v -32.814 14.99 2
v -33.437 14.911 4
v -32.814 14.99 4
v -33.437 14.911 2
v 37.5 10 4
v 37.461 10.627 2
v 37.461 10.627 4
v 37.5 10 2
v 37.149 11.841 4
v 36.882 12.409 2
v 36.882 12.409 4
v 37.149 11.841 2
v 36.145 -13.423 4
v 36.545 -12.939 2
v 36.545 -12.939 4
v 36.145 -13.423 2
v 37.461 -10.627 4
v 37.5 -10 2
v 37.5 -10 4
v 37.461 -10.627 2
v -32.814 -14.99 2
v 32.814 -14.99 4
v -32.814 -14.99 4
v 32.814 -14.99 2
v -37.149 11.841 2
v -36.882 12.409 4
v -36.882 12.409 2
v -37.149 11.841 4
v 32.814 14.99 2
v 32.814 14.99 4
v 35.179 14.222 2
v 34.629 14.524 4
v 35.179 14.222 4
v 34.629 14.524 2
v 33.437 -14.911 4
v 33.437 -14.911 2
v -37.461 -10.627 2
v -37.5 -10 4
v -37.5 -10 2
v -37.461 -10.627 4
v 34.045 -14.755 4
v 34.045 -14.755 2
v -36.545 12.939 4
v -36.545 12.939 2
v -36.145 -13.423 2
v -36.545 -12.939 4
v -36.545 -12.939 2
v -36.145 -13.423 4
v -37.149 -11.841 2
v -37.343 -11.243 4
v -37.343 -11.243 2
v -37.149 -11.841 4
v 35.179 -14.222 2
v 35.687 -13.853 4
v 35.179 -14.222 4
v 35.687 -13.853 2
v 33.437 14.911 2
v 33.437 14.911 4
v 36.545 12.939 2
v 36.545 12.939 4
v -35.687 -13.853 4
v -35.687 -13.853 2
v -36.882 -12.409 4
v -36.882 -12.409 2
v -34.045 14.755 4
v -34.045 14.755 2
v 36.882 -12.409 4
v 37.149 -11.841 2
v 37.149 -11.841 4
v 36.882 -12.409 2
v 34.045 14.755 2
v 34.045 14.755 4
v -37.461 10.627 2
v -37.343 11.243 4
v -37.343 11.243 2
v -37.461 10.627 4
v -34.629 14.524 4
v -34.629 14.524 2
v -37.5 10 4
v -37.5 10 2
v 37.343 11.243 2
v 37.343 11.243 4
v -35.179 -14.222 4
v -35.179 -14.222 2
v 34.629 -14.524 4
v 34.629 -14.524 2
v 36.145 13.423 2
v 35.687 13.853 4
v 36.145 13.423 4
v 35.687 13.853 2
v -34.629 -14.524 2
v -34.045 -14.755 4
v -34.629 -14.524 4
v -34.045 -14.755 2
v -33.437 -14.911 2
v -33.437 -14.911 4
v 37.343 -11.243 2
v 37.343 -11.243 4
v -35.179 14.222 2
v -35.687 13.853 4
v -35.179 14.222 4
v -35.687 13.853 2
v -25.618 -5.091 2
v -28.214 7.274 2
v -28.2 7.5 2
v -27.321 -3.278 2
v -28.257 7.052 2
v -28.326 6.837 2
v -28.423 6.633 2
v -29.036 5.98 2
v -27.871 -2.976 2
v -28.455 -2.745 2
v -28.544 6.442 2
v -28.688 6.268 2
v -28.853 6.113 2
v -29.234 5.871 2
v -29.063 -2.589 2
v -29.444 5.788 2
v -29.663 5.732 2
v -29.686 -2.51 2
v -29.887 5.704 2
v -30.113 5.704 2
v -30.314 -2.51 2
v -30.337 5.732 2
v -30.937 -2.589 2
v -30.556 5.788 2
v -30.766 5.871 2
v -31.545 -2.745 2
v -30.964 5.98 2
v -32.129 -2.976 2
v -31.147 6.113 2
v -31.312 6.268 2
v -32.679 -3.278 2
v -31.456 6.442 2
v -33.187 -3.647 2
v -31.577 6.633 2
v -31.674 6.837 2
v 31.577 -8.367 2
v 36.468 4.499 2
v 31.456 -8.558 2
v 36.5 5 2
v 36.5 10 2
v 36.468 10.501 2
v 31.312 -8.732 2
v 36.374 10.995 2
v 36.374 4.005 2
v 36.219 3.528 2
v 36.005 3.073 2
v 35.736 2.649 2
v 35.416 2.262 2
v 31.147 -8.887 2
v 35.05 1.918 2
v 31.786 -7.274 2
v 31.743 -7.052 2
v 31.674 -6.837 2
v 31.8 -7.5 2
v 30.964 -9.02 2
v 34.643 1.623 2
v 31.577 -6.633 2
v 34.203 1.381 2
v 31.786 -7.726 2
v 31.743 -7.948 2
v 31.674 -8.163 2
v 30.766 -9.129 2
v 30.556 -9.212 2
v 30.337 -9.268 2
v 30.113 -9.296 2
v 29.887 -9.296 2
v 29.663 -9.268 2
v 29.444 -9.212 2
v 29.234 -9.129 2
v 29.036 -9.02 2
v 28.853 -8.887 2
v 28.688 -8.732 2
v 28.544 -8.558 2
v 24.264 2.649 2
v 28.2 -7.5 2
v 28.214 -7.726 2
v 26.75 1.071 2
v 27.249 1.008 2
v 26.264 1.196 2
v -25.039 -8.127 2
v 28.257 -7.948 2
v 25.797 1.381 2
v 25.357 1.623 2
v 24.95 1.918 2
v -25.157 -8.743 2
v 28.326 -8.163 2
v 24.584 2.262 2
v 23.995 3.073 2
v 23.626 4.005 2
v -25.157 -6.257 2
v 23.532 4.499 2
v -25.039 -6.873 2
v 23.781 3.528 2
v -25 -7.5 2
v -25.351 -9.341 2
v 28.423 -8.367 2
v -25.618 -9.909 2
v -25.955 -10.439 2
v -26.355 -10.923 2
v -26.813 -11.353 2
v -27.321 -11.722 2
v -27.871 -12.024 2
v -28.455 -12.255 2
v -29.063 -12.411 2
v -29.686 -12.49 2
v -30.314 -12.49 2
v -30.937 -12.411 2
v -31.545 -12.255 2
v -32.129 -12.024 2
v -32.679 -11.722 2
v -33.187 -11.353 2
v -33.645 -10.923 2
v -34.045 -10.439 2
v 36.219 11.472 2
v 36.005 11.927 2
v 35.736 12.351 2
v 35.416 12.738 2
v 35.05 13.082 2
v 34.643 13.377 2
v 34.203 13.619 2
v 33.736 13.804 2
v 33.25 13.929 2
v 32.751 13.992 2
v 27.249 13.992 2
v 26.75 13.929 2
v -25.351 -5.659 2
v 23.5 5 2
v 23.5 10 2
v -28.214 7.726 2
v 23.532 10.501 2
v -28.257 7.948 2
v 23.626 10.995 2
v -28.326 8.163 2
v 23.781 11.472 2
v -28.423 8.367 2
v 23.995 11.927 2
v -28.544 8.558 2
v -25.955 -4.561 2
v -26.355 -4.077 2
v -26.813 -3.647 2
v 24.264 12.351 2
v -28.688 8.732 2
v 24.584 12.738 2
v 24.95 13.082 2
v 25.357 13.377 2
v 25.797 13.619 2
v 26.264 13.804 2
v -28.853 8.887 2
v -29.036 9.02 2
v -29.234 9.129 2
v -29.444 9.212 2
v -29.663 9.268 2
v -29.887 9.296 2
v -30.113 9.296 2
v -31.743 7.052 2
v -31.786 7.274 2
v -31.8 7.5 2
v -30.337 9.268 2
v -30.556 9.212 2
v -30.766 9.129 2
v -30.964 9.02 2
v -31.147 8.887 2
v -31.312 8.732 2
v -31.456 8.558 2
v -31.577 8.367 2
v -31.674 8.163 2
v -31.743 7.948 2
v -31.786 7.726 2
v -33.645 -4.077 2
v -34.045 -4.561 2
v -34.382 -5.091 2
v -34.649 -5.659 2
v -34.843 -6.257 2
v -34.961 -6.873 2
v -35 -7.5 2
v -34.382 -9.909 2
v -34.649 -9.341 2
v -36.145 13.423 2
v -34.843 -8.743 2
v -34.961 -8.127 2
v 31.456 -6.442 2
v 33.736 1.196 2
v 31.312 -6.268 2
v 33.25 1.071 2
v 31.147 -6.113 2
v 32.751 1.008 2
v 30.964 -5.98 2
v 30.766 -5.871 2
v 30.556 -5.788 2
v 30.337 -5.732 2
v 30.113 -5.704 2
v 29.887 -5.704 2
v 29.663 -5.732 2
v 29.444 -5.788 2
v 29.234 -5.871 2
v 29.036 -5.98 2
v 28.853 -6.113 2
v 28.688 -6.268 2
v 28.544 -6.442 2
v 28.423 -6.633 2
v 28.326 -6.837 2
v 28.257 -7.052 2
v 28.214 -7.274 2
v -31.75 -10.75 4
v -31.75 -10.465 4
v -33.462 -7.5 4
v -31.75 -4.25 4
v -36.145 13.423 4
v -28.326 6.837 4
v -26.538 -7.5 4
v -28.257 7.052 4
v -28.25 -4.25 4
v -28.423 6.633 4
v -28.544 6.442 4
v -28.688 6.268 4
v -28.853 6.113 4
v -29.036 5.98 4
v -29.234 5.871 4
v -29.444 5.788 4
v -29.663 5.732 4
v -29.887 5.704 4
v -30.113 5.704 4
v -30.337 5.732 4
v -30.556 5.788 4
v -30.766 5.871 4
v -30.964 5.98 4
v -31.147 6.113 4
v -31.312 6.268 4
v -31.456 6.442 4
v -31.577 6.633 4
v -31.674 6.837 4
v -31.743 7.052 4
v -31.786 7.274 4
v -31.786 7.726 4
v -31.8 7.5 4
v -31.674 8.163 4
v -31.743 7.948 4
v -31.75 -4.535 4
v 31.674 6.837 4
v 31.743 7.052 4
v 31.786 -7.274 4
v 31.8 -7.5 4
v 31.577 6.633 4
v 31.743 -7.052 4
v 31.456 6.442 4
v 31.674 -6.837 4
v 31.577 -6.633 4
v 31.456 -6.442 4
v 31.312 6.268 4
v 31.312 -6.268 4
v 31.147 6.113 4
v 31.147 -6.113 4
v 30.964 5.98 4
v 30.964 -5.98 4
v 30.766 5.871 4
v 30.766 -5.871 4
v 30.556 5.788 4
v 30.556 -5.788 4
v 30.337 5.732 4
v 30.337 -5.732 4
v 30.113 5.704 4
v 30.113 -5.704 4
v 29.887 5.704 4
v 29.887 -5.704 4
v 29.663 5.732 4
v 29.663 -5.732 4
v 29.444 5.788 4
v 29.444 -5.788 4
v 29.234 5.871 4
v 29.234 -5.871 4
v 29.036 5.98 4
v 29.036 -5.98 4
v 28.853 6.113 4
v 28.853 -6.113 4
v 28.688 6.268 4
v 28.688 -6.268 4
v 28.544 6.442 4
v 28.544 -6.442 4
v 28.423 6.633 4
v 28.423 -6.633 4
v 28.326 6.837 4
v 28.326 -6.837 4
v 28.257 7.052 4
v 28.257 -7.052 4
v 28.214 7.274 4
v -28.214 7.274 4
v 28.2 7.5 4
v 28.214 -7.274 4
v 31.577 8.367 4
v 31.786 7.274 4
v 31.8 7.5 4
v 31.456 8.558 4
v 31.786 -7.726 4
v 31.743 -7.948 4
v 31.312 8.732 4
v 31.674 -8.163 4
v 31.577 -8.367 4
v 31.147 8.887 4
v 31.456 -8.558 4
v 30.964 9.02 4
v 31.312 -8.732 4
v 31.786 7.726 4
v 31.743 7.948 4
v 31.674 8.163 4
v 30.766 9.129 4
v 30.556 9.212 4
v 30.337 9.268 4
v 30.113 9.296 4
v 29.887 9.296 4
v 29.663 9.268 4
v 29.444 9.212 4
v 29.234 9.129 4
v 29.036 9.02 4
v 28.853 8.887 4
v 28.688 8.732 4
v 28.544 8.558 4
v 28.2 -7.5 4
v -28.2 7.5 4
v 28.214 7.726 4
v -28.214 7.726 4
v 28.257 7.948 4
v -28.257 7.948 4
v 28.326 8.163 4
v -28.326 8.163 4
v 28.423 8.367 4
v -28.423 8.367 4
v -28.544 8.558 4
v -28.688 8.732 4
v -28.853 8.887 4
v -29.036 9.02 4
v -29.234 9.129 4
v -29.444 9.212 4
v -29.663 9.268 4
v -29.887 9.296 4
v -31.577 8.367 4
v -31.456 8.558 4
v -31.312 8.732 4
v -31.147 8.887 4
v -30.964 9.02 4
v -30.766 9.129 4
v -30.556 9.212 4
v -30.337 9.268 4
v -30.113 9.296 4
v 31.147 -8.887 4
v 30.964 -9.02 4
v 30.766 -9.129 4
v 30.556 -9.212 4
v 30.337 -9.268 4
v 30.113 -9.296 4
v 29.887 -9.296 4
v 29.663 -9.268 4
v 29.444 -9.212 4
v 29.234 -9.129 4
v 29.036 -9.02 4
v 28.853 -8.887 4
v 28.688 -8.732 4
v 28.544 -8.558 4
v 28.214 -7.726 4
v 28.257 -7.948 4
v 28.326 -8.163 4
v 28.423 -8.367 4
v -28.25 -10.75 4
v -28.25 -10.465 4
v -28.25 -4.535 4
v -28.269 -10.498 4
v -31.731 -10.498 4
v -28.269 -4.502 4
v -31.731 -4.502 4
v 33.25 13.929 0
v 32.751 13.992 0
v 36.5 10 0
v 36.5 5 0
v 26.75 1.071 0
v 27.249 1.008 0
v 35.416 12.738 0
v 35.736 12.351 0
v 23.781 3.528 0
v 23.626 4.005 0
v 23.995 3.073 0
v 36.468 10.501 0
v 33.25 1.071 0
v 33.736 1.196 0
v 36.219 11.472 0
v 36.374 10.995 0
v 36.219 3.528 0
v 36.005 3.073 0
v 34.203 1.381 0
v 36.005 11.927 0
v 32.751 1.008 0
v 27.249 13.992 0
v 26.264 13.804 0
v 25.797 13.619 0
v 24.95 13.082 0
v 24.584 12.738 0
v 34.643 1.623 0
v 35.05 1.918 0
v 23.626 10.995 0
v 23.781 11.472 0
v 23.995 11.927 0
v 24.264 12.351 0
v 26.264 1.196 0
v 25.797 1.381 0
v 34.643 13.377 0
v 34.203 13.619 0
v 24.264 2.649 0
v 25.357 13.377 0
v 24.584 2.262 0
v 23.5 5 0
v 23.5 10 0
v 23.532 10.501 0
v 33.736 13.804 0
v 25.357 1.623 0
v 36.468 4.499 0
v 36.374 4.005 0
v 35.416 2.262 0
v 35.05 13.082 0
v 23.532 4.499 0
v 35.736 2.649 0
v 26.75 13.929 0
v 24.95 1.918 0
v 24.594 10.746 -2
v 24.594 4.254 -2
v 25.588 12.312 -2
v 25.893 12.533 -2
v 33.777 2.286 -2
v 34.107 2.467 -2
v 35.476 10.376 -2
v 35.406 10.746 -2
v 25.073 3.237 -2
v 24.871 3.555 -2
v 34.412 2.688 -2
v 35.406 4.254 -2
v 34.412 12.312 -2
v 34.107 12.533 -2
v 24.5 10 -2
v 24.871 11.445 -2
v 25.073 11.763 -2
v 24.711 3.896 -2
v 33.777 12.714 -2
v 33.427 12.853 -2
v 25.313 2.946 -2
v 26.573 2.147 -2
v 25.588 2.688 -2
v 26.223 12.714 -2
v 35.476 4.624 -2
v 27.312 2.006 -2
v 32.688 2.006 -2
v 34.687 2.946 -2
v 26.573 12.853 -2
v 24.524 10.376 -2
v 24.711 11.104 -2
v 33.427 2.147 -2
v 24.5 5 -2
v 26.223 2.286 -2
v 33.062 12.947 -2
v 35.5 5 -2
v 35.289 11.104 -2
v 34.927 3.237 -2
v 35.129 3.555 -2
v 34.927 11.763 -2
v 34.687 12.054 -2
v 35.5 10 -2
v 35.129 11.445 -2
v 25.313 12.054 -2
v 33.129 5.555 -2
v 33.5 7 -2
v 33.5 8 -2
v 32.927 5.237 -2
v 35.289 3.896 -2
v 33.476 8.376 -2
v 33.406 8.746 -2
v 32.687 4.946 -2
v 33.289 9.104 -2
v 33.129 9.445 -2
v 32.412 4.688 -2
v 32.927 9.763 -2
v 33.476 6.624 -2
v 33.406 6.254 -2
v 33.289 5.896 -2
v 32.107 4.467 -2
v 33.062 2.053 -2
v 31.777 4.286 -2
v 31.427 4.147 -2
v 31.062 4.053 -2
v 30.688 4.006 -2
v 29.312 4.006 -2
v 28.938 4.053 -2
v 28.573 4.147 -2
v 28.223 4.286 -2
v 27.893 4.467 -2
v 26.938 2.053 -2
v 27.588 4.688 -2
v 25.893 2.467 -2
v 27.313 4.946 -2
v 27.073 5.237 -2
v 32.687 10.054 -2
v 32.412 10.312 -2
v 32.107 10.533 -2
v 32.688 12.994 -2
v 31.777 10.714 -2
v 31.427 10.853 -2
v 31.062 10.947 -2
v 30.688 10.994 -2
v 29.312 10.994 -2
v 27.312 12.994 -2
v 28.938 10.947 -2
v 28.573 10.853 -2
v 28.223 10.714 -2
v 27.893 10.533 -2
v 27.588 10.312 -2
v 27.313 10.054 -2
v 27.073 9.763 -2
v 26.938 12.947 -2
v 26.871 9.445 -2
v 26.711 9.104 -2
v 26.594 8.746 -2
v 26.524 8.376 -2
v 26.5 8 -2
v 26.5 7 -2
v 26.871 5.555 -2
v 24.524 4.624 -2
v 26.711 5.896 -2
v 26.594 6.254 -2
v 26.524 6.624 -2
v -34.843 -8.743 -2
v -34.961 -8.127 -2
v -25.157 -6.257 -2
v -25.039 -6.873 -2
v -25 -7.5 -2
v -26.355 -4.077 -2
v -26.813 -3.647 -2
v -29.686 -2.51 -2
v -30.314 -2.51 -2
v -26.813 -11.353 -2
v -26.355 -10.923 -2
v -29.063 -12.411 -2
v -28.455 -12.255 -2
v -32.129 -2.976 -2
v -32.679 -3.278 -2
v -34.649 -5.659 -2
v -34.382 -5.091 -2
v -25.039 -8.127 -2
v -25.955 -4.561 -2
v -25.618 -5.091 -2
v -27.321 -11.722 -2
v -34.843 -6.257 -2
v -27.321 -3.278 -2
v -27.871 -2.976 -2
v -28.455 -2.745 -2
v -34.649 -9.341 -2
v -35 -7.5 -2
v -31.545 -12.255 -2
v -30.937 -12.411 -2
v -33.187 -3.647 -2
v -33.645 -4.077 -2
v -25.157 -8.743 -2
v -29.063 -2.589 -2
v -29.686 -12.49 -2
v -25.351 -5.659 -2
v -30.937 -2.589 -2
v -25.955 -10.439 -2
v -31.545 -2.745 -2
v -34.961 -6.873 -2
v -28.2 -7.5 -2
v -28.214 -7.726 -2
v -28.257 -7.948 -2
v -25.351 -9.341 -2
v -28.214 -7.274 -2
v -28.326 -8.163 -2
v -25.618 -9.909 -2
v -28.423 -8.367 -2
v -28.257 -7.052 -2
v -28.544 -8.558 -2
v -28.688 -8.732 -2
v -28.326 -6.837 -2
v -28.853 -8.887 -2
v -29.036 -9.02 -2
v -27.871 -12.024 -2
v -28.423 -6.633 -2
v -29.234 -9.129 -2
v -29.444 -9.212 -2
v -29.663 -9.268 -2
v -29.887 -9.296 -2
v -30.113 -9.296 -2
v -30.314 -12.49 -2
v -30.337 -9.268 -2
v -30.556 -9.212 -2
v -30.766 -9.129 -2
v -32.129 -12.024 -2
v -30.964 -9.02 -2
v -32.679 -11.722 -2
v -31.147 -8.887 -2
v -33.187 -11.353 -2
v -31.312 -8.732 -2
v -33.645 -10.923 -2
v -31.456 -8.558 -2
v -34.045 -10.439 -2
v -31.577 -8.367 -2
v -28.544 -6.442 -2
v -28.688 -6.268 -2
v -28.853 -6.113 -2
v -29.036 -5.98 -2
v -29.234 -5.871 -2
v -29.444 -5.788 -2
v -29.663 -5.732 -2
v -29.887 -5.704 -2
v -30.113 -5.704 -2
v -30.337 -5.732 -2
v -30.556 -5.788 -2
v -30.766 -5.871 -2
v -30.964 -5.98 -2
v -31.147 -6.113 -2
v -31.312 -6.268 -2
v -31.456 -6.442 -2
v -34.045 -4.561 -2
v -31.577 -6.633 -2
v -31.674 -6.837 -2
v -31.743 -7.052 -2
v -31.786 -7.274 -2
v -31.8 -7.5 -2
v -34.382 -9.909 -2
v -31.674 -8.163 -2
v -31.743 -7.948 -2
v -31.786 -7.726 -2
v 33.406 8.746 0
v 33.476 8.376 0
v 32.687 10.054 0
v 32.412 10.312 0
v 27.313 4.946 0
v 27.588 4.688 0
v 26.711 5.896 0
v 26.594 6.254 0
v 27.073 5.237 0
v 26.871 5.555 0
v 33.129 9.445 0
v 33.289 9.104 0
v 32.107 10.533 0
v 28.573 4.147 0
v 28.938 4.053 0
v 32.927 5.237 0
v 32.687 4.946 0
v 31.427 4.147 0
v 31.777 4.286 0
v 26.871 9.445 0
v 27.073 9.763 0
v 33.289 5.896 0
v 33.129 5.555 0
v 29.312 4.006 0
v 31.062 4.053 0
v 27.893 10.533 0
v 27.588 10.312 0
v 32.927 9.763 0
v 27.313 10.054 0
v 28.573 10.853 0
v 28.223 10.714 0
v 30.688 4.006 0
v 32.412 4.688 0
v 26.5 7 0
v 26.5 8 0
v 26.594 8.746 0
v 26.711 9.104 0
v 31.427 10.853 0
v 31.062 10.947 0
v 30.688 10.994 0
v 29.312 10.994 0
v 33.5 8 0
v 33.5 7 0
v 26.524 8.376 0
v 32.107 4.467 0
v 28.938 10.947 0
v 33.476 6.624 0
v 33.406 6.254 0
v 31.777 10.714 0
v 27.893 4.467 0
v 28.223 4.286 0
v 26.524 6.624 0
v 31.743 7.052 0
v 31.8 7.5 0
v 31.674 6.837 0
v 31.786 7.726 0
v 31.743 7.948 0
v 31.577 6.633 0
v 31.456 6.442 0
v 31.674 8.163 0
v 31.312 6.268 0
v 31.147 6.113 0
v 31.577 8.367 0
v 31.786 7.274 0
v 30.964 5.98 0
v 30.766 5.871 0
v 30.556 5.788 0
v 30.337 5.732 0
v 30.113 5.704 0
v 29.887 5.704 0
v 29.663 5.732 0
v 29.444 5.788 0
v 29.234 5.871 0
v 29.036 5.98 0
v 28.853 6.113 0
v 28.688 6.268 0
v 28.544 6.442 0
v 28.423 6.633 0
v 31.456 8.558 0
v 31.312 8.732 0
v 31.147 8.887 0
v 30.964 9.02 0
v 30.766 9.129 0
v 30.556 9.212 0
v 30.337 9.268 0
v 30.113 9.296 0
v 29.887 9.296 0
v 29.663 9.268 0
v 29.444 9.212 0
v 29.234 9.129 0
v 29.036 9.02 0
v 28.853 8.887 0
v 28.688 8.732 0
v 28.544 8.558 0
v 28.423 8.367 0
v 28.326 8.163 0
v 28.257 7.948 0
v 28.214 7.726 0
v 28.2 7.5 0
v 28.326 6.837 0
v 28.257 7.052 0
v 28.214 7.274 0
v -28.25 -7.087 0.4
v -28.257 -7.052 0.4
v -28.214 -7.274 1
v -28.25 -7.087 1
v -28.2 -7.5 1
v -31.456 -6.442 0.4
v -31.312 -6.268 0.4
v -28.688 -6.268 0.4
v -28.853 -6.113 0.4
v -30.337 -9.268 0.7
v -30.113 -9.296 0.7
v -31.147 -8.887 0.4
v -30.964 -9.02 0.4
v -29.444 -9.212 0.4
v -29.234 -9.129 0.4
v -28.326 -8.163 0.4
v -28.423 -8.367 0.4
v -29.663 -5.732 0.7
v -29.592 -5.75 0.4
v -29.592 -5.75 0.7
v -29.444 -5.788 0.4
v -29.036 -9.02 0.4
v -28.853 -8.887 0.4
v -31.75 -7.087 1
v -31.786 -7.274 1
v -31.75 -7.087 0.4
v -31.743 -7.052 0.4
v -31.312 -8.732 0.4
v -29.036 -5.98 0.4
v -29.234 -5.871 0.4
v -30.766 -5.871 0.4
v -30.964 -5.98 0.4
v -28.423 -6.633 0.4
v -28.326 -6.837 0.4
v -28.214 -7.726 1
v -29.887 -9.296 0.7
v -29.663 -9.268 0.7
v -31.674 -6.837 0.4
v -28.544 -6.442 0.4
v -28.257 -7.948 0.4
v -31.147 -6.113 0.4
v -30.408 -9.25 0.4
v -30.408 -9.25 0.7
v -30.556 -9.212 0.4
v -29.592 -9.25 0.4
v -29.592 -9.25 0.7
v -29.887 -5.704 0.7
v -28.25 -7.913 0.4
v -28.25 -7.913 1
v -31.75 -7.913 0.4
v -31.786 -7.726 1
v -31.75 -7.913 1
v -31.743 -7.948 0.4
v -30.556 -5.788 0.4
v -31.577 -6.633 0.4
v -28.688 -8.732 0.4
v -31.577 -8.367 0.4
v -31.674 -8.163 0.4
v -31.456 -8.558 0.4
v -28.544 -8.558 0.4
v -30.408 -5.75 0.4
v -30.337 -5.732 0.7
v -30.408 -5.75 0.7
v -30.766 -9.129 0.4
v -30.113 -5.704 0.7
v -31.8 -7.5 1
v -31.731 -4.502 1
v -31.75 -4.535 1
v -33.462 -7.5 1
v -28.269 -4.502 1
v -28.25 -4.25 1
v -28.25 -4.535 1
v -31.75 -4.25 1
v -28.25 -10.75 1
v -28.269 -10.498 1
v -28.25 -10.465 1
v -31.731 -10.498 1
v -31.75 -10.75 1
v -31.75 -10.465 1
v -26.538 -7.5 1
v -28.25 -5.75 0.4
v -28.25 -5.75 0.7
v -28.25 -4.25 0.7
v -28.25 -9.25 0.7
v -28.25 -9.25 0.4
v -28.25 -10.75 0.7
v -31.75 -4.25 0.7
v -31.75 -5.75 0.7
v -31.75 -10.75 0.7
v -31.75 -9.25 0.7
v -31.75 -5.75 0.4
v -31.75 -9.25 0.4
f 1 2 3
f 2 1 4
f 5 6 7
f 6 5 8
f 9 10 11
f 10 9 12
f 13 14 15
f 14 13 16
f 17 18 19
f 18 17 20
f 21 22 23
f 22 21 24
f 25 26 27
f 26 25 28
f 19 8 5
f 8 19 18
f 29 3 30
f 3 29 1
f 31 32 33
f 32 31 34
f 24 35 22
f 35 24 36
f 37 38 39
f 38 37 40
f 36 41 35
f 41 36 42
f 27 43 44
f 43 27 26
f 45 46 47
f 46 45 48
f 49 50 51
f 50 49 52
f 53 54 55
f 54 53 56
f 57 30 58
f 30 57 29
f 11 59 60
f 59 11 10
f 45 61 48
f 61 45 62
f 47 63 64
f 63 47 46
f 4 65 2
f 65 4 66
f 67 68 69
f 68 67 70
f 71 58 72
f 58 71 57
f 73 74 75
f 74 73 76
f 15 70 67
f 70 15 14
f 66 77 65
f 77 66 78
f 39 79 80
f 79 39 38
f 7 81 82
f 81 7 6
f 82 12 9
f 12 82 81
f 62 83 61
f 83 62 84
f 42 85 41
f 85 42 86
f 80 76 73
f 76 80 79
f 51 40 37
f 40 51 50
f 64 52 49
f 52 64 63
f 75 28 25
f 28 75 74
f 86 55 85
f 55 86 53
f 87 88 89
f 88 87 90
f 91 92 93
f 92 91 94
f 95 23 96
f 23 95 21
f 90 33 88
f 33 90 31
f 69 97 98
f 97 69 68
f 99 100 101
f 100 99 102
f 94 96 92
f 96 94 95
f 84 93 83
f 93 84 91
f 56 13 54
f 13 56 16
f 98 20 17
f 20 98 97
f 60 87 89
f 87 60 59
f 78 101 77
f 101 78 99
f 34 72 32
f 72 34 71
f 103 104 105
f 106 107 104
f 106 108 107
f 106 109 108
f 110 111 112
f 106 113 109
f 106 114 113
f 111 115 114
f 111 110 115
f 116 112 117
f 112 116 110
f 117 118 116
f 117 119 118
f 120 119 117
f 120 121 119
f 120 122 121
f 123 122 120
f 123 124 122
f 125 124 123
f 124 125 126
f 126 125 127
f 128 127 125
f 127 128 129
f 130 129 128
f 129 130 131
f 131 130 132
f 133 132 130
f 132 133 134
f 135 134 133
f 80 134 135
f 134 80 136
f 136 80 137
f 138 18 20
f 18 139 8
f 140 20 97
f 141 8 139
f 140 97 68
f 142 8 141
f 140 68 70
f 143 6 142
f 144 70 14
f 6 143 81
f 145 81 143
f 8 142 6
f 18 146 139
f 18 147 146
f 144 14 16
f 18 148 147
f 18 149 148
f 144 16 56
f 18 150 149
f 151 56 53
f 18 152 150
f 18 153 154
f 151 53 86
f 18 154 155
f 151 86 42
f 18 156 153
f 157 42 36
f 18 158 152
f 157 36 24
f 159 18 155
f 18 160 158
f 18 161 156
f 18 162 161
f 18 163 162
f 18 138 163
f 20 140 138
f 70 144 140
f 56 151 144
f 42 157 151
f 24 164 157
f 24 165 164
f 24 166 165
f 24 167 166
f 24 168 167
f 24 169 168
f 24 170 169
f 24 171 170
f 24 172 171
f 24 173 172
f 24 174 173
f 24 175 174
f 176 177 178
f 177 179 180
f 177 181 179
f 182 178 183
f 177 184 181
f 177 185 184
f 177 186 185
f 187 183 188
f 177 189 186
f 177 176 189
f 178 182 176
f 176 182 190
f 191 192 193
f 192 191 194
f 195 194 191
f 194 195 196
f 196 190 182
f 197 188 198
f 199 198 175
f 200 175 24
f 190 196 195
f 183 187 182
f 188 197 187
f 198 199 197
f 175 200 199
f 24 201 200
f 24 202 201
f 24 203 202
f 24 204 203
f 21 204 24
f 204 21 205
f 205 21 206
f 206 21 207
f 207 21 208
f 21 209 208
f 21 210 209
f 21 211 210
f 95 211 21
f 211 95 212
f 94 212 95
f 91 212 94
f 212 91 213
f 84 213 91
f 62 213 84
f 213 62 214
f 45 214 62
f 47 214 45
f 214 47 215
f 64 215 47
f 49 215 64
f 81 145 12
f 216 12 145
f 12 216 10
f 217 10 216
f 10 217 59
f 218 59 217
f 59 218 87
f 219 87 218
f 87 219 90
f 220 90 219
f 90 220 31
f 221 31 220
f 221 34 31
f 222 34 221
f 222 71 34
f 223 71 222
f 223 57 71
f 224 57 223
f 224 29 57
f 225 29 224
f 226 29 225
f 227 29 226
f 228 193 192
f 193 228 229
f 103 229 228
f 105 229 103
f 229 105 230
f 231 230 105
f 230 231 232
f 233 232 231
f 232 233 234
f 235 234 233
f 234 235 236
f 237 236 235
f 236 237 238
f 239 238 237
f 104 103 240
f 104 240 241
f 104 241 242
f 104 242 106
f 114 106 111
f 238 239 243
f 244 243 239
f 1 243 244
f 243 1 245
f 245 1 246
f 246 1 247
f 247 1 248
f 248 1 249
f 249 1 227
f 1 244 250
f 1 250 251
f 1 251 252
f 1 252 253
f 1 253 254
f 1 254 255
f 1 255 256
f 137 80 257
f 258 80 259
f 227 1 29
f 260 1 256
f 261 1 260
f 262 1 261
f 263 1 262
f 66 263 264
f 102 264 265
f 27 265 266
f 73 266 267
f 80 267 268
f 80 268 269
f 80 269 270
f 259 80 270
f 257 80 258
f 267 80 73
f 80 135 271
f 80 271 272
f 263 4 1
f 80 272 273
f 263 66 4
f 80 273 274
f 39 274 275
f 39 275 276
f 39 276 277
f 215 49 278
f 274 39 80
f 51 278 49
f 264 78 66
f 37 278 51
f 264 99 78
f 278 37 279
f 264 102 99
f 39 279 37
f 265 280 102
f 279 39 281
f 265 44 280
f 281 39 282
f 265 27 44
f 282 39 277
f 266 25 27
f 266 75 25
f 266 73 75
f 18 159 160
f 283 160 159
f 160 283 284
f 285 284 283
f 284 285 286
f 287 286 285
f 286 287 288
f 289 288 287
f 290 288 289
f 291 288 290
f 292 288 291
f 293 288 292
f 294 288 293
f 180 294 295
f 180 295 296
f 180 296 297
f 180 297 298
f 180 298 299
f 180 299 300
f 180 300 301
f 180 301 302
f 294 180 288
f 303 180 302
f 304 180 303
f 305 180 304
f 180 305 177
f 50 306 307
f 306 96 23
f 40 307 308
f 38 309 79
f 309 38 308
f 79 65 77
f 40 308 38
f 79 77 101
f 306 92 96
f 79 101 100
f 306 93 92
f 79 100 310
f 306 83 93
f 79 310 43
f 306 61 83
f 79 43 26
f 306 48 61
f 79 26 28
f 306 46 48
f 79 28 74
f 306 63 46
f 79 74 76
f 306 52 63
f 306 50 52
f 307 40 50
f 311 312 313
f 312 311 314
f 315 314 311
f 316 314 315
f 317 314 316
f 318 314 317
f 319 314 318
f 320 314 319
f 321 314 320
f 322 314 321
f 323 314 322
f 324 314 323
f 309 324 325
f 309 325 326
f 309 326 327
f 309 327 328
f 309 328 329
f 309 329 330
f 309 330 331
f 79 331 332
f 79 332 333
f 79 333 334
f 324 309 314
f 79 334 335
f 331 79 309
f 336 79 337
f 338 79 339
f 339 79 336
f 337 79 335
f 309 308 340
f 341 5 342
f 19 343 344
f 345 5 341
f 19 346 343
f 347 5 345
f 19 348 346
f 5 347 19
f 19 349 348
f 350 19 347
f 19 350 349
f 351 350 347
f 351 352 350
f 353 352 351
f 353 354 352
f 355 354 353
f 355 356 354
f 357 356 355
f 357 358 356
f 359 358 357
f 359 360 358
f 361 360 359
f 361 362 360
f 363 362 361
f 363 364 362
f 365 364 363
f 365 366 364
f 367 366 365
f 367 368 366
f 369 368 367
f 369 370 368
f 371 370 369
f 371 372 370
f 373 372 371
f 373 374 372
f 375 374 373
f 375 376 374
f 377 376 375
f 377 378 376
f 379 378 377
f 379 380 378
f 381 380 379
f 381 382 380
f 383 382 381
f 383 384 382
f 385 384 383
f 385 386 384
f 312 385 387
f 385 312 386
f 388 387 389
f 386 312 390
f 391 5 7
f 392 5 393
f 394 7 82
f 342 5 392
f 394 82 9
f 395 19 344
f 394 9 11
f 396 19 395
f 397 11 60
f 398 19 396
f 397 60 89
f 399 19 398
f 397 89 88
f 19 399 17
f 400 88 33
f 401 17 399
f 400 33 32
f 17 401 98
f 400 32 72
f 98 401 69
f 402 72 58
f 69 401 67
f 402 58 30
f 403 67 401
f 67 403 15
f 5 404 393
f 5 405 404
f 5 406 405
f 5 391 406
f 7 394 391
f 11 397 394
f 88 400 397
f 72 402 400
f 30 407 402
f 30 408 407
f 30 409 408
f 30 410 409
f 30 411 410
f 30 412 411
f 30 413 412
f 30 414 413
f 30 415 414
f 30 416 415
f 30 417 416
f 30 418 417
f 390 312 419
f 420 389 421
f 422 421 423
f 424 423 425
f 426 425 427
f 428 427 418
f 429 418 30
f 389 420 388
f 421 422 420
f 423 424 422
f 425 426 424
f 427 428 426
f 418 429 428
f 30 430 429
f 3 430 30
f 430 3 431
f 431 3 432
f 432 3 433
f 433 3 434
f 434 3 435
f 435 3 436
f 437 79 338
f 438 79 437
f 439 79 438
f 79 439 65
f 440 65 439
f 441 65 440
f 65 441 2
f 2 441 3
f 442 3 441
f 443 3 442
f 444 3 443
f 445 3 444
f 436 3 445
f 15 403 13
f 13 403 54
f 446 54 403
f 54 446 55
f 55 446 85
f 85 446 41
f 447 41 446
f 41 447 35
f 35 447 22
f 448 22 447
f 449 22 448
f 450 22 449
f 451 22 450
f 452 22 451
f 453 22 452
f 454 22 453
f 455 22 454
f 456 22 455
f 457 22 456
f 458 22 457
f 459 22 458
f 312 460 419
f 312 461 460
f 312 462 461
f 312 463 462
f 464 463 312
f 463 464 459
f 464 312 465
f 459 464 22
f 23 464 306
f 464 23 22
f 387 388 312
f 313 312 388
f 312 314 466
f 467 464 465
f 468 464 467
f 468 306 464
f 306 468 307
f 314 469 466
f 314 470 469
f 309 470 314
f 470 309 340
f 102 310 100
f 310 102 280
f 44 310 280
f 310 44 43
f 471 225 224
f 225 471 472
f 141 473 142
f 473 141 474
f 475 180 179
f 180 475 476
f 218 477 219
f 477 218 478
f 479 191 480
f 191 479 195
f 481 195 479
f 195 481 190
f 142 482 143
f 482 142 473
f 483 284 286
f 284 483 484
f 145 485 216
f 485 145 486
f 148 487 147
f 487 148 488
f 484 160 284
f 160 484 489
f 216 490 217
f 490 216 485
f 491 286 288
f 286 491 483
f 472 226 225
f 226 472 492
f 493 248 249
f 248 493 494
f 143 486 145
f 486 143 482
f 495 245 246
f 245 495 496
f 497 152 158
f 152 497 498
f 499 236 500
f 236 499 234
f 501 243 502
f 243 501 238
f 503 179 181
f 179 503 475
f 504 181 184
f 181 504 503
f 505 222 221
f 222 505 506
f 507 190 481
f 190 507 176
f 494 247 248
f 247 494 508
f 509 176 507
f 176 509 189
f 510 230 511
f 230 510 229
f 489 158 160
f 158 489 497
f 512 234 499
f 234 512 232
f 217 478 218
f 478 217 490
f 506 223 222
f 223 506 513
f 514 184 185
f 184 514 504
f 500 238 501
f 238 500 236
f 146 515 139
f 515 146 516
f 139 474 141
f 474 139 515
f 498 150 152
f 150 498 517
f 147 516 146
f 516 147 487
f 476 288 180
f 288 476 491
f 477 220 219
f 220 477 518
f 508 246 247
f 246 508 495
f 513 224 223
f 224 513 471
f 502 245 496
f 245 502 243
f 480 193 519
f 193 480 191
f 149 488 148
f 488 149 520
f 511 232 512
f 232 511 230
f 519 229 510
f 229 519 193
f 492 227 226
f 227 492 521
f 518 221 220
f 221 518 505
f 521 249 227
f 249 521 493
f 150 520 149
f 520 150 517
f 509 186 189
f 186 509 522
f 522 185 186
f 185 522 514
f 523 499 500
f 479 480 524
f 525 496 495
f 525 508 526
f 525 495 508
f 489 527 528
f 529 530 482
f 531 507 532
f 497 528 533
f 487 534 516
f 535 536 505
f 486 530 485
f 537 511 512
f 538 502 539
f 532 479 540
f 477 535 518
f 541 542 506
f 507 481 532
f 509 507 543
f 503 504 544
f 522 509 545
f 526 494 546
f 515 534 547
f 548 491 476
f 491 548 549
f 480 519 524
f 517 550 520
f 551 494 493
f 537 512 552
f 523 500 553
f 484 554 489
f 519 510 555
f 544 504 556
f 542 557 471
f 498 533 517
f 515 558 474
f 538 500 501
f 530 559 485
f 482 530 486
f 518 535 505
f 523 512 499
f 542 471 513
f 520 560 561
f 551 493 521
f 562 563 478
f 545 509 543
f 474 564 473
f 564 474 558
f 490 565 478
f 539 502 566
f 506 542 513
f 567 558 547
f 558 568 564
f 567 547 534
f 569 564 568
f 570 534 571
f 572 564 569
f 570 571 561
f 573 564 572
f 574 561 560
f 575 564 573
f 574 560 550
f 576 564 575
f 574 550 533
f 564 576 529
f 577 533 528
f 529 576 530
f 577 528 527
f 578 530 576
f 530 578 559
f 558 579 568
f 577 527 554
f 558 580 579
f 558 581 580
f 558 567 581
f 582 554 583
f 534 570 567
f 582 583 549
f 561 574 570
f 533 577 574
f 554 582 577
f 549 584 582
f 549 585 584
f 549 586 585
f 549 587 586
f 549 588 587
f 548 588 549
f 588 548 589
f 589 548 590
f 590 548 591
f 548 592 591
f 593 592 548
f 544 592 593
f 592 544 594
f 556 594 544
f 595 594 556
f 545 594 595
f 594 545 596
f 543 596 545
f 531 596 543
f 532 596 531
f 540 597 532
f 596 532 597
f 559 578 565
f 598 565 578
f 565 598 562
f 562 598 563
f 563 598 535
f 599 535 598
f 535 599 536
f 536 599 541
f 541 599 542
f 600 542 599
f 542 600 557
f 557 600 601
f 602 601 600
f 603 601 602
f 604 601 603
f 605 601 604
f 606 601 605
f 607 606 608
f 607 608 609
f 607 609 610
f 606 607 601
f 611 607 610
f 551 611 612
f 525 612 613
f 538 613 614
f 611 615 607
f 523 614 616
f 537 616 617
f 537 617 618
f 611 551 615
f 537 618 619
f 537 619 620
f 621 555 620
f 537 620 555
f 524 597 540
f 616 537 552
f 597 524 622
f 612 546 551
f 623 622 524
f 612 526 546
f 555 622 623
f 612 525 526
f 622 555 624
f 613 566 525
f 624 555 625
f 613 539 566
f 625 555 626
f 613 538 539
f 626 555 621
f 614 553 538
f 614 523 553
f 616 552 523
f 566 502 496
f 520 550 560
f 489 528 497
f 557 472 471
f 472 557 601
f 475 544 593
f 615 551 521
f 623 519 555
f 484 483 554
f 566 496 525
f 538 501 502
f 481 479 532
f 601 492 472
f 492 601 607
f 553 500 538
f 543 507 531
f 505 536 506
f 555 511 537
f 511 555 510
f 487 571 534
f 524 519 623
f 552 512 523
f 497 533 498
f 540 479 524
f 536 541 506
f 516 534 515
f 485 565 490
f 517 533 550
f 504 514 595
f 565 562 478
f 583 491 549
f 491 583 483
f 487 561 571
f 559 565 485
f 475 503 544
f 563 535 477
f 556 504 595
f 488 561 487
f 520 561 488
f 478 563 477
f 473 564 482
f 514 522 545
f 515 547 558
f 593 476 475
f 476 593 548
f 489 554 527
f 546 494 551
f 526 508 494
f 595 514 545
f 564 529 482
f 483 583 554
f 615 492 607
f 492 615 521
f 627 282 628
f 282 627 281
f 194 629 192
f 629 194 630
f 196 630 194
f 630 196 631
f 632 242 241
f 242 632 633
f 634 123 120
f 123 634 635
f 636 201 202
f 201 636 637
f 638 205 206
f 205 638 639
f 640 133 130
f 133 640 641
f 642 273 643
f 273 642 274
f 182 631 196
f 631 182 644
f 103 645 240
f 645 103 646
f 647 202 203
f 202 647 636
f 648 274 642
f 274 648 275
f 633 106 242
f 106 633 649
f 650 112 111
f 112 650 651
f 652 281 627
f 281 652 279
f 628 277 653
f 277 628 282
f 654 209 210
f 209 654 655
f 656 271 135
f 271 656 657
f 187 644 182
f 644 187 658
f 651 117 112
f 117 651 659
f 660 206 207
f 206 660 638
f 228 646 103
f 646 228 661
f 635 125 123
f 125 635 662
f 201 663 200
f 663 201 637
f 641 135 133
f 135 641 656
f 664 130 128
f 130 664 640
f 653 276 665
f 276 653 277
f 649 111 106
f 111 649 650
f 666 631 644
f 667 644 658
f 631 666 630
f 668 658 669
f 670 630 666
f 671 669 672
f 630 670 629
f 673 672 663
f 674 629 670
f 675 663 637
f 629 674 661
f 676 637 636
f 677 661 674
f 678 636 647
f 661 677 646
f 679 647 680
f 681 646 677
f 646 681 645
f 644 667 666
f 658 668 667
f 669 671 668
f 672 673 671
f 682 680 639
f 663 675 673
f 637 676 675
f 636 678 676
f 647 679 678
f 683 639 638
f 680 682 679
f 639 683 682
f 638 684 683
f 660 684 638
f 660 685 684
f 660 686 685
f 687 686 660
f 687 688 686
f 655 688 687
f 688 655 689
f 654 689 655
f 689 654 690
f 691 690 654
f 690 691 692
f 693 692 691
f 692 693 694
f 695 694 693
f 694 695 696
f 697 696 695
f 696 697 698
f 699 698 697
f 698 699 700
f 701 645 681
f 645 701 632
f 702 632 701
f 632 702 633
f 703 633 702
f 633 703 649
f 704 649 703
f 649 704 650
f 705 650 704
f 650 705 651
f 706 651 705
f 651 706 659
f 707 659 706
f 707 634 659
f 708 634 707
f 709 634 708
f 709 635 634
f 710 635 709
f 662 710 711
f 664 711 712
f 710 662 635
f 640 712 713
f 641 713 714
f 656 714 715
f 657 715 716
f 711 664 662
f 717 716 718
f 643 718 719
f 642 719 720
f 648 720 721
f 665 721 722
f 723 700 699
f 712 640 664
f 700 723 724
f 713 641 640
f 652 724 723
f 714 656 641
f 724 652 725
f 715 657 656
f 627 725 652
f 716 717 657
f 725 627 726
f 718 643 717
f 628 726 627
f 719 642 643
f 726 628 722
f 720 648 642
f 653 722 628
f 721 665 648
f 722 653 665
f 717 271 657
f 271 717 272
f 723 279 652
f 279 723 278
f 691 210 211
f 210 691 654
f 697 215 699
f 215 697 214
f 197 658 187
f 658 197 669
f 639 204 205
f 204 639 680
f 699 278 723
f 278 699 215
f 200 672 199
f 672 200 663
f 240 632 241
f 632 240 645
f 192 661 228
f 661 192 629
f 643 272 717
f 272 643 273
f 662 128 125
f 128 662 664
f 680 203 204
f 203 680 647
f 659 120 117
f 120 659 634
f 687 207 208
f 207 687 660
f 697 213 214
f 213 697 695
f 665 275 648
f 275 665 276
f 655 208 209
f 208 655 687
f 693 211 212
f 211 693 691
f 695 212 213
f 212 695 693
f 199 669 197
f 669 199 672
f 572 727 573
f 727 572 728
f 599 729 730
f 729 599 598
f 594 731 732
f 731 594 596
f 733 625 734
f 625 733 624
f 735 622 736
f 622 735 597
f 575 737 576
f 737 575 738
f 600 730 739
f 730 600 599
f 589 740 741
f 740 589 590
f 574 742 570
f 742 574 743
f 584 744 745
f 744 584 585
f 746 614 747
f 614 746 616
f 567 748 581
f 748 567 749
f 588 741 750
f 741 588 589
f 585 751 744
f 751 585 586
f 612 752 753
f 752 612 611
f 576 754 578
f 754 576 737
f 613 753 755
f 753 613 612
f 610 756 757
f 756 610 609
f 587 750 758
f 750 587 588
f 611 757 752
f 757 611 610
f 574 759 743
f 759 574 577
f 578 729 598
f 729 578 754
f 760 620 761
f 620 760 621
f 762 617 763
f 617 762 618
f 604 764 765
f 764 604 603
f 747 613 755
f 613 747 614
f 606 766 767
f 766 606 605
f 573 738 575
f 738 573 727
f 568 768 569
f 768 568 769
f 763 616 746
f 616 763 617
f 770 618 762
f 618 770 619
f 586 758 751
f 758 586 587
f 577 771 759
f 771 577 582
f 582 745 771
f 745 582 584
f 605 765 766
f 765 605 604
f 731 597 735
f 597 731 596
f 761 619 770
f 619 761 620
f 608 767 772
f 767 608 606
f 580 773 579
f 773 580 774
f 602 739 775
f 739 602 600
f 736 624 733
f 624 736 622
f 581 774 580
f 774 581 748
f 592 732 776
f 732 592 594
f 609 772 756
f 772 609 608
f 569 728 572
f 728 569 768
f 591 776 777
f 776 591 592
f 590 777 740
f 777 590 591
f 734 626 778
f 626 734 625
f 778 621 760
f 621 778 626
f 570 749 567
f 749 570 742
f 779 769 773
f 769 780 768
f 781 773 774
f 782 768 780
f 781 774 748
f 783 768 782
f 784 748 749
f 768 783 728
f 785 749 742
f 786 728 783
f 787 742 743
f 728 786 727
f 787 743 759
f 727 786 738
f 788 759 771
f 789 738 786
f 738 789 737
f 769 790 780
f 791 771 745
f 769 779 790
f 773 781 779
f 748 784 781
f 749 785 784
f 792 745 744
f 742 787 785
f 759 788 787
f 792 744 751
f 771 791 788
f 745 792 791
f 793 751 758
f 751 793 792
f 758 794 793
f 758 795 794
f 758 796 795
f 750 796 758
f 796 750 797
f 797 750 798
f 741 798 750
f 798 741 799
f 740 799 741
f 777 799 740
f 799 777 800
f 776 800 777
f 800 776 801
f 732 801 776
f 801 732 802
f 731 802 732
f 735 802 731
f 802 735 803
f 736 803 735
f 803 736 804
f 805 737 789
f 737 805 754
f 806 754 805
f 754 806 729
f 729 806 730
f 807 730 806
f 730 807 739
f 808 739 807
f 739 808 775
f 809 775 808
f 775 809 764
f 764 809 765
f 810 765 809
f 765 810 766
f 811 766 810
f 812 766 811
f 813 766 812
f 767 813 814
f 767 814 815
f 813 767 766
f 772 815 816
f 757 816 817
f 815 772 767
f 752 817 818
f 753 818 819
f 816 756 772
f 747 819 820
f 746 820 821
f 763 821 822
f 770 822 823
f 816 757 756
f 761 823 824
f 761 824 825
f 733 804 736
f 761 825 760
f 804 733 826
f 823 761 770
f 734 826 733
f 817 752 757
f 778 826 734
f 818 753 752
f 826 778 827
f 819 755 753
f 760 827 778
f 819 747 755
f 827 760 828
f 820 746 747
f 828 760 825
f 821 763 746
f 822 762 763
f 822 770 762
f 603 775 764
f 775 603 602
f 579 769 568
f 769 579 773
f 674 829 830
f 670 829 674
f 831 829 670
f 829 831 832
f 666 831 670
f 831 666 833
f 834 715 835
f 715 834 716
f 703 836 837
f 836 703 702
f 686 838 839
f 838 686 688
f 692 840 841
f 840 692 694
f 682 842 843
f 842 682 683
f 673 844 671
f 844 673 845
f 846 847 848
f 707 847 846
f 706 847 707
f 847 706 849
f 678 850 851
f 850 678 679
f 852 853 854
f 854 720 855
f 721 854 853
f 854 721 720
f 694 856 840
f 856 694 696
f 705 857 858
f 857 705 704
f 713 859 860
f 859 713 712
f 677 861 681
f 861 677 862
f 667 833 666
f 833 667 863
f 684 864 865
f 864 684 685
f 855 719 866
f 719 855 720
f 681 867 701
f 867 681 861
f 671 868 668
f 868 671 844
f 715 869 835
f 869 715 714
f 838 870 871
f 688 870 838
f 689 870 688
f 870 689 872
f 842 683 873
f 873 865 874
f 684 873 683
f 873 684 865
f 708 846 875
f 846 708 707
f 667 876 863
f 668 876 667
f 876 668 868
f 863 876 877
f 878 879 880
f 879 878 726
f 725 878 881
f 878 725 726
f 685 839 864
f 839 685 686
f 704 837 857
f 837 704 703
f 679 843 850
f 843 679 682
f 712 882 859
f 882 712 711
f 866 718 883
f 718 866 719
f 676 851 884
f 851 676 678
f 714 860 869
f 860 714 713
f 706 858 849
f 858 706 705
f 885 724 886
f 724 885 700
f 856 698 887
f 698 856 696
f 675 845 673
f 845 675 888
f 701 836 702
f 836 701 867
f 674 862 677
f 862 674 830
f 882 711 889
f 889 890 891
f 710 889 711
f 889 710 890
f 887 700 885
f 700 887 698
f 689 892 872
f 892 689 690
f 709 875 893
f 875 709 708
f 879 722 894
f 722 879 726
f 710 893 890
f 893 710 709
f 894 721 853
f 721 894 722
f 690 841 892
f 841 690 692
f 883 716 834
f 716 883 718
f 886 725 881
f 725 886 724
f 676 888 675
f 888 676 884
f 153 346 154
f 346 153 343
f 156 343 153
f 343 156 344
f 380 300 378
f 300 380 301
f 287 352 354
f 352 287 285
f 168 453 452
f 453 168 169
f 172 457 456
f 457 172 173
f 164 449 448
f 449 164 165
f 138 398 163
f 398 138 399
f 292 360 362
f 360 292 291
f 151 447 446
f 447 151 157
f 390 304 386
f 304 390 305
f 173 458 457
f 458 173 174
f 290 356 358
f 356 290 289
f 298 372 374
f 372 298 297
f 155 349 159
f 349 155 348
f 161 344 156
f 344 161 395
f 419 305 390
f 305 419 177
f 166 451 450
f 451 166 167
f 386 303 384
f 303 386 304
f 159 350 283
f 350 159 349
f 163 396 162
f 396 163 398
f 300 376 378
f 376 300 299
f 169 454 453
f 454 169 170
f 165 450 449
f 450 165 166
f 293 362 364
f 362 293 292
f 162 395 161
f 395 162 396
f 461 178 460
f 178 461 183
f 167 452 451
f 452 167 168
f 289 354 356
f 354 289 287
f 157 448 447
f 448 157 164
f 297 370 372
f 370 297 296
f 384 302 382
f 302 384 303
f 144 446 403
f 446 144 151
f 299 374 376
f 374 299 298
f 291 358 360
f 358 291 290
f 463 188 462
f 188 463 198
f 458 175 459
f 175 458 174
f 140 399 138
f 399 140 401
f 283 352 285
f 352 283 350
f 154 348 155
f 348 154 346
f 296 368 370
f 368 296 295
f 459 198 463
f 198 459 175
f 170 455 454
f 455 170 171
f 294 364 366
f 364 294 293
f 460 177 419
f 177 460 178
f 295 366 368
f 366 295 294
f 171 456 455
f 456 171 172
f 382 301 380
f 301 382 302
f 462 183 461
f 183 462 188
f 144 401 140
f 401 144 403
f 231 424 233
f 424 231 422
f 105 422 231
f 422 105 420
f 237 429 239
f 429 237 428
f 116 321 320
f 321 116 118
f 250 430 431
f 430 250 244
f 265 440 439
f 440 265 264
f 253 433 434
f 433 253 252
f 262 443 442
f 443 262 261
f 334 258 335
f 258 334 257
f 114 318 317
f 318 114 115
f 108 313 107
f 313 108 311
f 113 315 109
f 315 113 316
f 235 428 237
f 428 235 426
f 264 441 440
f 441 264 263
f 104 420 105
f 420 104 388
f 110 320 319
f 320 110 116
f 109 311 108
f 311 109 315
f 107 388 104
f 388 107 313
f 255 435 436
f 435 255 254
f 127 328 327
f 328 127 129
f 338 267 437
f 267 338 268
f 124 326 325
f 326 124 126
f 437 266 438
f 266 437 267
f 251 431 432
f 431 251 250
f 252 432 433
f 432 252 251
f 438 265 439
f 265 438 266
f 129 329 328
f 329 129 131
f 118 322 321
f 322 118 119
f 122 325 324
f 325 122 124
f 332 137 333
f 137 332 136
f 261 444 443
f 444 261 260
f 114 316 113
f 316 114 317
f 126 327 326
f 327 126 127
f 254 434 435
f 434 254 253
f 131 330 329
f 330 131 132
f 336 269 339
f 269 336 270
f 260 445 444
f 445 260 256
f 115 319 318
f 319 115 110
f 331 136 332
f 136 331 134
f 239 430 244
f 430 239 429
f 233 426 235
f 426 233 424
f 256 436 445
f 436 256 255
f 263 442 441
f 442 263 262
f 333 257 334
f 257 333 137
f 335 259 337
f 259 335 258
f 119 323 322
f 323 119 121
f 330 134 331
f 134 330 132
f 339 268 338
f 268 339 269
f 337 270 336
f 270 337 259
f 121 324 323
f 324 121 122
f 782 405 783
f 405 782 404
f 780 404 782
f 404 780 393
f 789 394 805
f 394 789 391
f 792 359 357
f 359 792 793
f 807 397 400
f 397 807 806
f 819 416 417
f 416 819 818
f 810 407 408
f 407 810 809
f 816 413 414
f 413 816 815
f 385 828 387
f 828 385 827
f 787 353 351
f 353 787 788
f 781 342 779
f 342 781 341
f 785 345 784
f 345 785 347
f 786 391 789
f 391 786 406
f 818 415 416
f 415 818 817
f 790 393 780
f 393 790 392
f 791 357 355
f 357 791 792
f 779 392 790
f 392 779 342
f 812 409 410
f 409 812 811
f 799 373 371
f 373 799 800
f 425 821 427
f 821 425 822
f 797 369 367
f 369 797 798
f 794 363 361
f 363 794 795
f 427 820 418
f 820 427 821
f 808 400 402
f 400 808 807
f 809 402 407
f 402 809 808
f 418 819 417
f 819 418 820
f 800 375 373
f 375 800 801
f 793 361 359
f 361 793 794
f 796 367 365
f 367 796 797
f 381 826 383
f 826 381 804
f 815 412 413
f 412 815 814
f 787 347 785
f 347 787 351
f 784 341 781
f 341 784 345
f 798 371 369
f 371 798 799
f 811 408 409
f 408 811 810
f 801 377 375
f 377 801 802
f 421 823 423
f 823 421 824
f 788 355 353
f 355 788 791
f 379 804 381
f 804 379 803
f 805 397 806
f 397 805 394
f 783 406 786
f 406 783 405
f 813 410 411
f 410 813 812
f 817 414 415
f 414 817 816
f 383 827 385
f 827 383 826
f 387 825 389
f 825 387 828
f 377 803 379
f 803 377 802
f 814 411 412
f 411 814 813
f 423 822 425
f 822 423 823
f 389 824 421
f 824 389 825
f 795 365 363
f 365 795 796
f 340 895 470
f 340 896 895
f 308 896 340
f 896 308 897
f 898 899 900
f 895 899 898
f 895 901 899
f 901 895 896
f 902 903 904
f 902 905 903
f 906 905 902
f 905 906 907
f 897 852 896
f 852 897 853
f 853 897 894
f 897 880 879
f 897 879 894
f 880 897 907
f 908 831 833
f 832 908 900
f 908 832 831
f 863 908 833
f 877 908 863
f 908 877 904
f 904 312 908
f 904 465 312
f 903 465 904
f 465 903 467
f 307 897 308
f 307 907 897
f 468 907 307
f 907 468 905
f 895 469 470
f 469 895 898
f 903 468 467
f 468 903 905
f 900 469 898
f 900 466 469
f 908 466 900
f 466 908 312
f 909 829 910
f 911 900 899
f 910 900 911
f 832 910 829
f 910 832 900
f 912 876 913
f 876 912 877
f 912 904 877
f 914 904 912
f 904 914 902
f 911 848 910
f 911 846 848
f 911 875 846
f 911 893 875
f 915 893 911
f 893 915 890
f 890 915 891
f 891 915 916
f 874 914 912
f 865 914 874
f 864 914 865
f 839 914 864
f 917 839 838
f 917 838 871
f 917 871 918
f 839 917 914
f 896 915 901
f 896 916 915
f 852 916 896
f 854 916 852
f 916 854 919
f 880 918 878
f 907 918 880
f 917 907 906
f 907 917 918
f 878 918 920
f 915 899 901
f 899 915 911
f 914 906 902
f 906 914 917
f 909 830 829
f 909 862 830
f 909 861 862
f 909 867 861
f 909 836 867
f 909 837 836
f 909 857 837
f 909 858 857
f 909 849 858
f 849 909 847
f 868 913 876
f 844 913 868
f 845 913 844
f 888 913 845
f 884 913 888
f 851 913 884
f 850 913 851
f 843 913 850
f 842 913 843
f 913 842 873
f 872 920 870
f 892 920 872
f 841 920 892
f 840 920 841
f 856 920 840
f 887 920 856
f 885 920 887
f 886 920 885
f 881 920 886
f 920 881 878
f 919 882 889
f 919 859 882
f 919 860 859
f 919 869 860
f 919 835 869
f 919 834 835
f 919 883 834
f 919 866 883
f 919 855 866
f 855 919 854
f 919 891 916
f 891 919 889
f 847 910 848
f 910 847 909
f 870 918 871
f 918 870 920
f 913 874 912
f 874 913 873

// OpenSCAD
$fn = 50;


difference() {
	union() {
		translate(v = [0, 0, 2]) {
			rotate(a = [0, 0, 0]) {
				hull() {
					translate(v = [-32.5000000000, 10.0000000000, 0]) {
						rotate(a = [0, 0, 0]) {
							translate(v = [0, 0, 0]) {
								rotate(a = [0, 0, 0]) {
									cylinder(h = 2, r = 5);
								}
							}
						}
					}
					translate(v = [32.5000000000, 10.0000000000, 0]) {
						rotate(a = [0, 0, 0]) {
							translate(v = [0, 0, 0]) {
								rotate(a = [0, 0, 0]) {
									cylinder(h = 2, r = 5);
								}
							}
						}
					}
					translate(v = [-32.5000000000, -10.0000000000, 0]) {
						rotate(a = [0, 0, 0]) {
							translate(v = [0, 0, 0]) {
								rotate(a = [0, 0, 0]) {
									cylinder(h = 2, r = 5);
								}
							}
						}
					}
					translate(v = [32.5000000000, -10.0000000000, 0]) {
						rotate(a = [0, 0, 0]) {
							translate(v = [0, 0, 0]) {
								rotate(a = [0, 0, 0]) {
									cylinder(h = 2, r = 5);
								}
							}
						}
					}
				}
			}
		}
		translate(v = [30.0000000000, 7.5000000000, 0]) {
			rotate(a = [0, 0, 0]) {
				hull() {
					translate(v = [-2.5000000000, 2.5000000000, 0]) {
						rotate(a = [0, 0, 0]) {
							cylinder(h = 2, r1 = 4.0000000000, r2 = 4.0000000000);
						}
					}
					translate(v = [2.5000000000, 2.5000000000, 0]) {
						rotate(a = [0, 0, 0]) {
							cylinder(h = 2, r1 = 4.0000000000, r2 = 4.0000000000);
						}
					}
					translate(v = [-2.5000000000, -2.5000000000, 0]) {
						rotate(a = [0, 0, 0]) {
							cylinder(h = 2, r1 = 4.0000000000, r2 = 4.0000000000);
						}
					}
					translate(v = [2.5000000000, -2.5000000000, 0]) {
						rotate(a = [0, 0, 0]) {
							cylinder(h = 2, r1 = 4.0000000000, r2 = 4.0000000000);
						}
					}
				}
			}
		}
		translate(v = [30.0000000000, 7.5000000000, -2]) {
			rotate(a = [0, 180, 0]) {
				hull() {
					translate(v = [-2.5000000000, 2.5000000000, 0]) {
						rotate(a = [0, 180, 0]) {
							cylinder(h = 2, r1 = 3.0000000000, r2 = 4.0000000000);
						}
					}
					translate(v = [2.5000000000, 2.5000000000, 0]) {
						rotate(a = [0, 180, 0]) {
							cylinder(h = 2, r1 = 3.0000000000, r2 = 4.0000000000);
						}
					}
					translate(v = [-2.5000000000, -2.5000000000, 0]) {
						rotate(a = [0, 180, 0]) {
							cylinder(h = 2, r1 = 3.0000000000, r2 = 4.0000000000);
						}
					}
					translate(v = [2.5000000000, -2.5000000000, 0]) {
						rotate(a = [0, 180, 0]) {
							cylinder(h = 2, r1 = 3.0000000000, r2 = 4.0000000000);
						}
					}
				}
			}
		}
		translate(v = [-30.0000000000, -7.5000000000, -2.0000000000]) {
			rotate(a = [0, 0, 0]) {
				cylinder(h = 4, r = 5);
			}
		}
	}
	union() {
		translate(v = [30.0000000000, 7.5000000000, -2]) {
			rotate(a = [0, 0, 0]) {
				hull() {
					translate(v = [-0.5000000000, 0.5000000000, 0]) {
						rotate(a = [0, 0, 0]) {
							translate(v = [0, 0, 0]) {
								rotate(a = [0, 0, 0]) {
									cylinder(h = 2, r = 3.0000000000);
								}
							}
						}
					}
					translate(v = [0.5000000000, 0.5000000000, 0]) {
						rotate(a = [0, 0, 0]) {
							translate(v = [0, 0, 0]) {
								rotate(a = [0, 0, 0]) {
									cylinder(h = 2, r = 3.0000000000);
								}
							}
						}
					}
					translate(v = [-0.5000000000, -0.5000000000, 0]) {
						rotate(a = [0, 0, 0]) {
							translate(v = [0, 0, 0]) {
								rotate(a = [0, 0, 0]) {
									cylinder(h = 2, r = 3.0000000000);
								}
							}
						}
					}
					translate(v = [0.5000000000, -0.5000000000, 0]) {
						rotate(a = [0, 0, 0]) {
							translate(v = [0, 0, 0]) {
								rotate(a = [0, 0, 0]) {
									cylinder(h = 2, r = 3.0000000000);
								}
							}
						}
					}
				}
			}
		}
		translate(v = [-30.0000000000, -7.5000000000, -50]) {
			rotate(a = [0, 0, 0]) {
				cylinder(h = 100, r = 1.8000000000);
			}
		}
		translate(v = [30.0000000000, -7.5000000000, -50]) {
			rotate(a = [0, 0, 0]) {
				cylinder(h = 100, r = 1.8000000000);
			}
		}
		translate(v = [-30.0000000000, 7.5000000000, -50]) {
			rotate(a = [0, 0, 0]) {
				cylinder(h = 100, r = 1.8000000000);
			}
		}
		translate(v = [30.0000000000, 7.5000000000, -50]) {
			rotate(a = [0, 0, 0]) {
				cylinder(h = 100, r = 1.8000000000);
			}
		}
		translate(v = [-30.0000000000, -7.5000000000, 1]) {
			rotate(a = [0, 0, 0]) {
				#translate(v = [0, 0, 0]) {
					rotate(a = [0, 0, 0]) {
						linear_extrude(height = 3) {
							polygon(points = [[3.4620000000, 0.0000000000], [1.7310000000, 2.9981799479], [-1.7310000000, 2.9981799479], [-3.4620000000, 0.0000000000], [-1.7310000000, -2.9981799479], [1.7310000000, -2.9981799479]]);
						}
					}
				}
			}
		}
		#translate(v = [-31.7500000000, -10.7500000000, 4]) {
			rotate(a = [0, 0, 0]) {
				cube(size = [3.5000000000, 6.5000000000, 0.3000000000]);
			}
		}
		#translate(v = [-31.7500000000, -9.2500000000, 4.3000000000]) {
			rotate(a = [0, 0, 0]) {
				cube(size = [3.5000000000, 3.5000000000, 0.3000000000]);
			}
		}
		#translate(v = [-31.7500000000, -10.7500000000, 0.7000000000]) {
			rotate(a = [0, 0, 0]) {
				cube(size = [3.5000000000, 6.5000000000, 0.3000000000]);
			}
		}
		#translate(v = [-31.7500000000, -9.2500000000, 0.4000000000]) {
			rotate(a = [0, 0, 0]) {
				cube(size = [3.5000000000, 3.5000000000, 0.3000000000]);
			}
		}
	}
}
